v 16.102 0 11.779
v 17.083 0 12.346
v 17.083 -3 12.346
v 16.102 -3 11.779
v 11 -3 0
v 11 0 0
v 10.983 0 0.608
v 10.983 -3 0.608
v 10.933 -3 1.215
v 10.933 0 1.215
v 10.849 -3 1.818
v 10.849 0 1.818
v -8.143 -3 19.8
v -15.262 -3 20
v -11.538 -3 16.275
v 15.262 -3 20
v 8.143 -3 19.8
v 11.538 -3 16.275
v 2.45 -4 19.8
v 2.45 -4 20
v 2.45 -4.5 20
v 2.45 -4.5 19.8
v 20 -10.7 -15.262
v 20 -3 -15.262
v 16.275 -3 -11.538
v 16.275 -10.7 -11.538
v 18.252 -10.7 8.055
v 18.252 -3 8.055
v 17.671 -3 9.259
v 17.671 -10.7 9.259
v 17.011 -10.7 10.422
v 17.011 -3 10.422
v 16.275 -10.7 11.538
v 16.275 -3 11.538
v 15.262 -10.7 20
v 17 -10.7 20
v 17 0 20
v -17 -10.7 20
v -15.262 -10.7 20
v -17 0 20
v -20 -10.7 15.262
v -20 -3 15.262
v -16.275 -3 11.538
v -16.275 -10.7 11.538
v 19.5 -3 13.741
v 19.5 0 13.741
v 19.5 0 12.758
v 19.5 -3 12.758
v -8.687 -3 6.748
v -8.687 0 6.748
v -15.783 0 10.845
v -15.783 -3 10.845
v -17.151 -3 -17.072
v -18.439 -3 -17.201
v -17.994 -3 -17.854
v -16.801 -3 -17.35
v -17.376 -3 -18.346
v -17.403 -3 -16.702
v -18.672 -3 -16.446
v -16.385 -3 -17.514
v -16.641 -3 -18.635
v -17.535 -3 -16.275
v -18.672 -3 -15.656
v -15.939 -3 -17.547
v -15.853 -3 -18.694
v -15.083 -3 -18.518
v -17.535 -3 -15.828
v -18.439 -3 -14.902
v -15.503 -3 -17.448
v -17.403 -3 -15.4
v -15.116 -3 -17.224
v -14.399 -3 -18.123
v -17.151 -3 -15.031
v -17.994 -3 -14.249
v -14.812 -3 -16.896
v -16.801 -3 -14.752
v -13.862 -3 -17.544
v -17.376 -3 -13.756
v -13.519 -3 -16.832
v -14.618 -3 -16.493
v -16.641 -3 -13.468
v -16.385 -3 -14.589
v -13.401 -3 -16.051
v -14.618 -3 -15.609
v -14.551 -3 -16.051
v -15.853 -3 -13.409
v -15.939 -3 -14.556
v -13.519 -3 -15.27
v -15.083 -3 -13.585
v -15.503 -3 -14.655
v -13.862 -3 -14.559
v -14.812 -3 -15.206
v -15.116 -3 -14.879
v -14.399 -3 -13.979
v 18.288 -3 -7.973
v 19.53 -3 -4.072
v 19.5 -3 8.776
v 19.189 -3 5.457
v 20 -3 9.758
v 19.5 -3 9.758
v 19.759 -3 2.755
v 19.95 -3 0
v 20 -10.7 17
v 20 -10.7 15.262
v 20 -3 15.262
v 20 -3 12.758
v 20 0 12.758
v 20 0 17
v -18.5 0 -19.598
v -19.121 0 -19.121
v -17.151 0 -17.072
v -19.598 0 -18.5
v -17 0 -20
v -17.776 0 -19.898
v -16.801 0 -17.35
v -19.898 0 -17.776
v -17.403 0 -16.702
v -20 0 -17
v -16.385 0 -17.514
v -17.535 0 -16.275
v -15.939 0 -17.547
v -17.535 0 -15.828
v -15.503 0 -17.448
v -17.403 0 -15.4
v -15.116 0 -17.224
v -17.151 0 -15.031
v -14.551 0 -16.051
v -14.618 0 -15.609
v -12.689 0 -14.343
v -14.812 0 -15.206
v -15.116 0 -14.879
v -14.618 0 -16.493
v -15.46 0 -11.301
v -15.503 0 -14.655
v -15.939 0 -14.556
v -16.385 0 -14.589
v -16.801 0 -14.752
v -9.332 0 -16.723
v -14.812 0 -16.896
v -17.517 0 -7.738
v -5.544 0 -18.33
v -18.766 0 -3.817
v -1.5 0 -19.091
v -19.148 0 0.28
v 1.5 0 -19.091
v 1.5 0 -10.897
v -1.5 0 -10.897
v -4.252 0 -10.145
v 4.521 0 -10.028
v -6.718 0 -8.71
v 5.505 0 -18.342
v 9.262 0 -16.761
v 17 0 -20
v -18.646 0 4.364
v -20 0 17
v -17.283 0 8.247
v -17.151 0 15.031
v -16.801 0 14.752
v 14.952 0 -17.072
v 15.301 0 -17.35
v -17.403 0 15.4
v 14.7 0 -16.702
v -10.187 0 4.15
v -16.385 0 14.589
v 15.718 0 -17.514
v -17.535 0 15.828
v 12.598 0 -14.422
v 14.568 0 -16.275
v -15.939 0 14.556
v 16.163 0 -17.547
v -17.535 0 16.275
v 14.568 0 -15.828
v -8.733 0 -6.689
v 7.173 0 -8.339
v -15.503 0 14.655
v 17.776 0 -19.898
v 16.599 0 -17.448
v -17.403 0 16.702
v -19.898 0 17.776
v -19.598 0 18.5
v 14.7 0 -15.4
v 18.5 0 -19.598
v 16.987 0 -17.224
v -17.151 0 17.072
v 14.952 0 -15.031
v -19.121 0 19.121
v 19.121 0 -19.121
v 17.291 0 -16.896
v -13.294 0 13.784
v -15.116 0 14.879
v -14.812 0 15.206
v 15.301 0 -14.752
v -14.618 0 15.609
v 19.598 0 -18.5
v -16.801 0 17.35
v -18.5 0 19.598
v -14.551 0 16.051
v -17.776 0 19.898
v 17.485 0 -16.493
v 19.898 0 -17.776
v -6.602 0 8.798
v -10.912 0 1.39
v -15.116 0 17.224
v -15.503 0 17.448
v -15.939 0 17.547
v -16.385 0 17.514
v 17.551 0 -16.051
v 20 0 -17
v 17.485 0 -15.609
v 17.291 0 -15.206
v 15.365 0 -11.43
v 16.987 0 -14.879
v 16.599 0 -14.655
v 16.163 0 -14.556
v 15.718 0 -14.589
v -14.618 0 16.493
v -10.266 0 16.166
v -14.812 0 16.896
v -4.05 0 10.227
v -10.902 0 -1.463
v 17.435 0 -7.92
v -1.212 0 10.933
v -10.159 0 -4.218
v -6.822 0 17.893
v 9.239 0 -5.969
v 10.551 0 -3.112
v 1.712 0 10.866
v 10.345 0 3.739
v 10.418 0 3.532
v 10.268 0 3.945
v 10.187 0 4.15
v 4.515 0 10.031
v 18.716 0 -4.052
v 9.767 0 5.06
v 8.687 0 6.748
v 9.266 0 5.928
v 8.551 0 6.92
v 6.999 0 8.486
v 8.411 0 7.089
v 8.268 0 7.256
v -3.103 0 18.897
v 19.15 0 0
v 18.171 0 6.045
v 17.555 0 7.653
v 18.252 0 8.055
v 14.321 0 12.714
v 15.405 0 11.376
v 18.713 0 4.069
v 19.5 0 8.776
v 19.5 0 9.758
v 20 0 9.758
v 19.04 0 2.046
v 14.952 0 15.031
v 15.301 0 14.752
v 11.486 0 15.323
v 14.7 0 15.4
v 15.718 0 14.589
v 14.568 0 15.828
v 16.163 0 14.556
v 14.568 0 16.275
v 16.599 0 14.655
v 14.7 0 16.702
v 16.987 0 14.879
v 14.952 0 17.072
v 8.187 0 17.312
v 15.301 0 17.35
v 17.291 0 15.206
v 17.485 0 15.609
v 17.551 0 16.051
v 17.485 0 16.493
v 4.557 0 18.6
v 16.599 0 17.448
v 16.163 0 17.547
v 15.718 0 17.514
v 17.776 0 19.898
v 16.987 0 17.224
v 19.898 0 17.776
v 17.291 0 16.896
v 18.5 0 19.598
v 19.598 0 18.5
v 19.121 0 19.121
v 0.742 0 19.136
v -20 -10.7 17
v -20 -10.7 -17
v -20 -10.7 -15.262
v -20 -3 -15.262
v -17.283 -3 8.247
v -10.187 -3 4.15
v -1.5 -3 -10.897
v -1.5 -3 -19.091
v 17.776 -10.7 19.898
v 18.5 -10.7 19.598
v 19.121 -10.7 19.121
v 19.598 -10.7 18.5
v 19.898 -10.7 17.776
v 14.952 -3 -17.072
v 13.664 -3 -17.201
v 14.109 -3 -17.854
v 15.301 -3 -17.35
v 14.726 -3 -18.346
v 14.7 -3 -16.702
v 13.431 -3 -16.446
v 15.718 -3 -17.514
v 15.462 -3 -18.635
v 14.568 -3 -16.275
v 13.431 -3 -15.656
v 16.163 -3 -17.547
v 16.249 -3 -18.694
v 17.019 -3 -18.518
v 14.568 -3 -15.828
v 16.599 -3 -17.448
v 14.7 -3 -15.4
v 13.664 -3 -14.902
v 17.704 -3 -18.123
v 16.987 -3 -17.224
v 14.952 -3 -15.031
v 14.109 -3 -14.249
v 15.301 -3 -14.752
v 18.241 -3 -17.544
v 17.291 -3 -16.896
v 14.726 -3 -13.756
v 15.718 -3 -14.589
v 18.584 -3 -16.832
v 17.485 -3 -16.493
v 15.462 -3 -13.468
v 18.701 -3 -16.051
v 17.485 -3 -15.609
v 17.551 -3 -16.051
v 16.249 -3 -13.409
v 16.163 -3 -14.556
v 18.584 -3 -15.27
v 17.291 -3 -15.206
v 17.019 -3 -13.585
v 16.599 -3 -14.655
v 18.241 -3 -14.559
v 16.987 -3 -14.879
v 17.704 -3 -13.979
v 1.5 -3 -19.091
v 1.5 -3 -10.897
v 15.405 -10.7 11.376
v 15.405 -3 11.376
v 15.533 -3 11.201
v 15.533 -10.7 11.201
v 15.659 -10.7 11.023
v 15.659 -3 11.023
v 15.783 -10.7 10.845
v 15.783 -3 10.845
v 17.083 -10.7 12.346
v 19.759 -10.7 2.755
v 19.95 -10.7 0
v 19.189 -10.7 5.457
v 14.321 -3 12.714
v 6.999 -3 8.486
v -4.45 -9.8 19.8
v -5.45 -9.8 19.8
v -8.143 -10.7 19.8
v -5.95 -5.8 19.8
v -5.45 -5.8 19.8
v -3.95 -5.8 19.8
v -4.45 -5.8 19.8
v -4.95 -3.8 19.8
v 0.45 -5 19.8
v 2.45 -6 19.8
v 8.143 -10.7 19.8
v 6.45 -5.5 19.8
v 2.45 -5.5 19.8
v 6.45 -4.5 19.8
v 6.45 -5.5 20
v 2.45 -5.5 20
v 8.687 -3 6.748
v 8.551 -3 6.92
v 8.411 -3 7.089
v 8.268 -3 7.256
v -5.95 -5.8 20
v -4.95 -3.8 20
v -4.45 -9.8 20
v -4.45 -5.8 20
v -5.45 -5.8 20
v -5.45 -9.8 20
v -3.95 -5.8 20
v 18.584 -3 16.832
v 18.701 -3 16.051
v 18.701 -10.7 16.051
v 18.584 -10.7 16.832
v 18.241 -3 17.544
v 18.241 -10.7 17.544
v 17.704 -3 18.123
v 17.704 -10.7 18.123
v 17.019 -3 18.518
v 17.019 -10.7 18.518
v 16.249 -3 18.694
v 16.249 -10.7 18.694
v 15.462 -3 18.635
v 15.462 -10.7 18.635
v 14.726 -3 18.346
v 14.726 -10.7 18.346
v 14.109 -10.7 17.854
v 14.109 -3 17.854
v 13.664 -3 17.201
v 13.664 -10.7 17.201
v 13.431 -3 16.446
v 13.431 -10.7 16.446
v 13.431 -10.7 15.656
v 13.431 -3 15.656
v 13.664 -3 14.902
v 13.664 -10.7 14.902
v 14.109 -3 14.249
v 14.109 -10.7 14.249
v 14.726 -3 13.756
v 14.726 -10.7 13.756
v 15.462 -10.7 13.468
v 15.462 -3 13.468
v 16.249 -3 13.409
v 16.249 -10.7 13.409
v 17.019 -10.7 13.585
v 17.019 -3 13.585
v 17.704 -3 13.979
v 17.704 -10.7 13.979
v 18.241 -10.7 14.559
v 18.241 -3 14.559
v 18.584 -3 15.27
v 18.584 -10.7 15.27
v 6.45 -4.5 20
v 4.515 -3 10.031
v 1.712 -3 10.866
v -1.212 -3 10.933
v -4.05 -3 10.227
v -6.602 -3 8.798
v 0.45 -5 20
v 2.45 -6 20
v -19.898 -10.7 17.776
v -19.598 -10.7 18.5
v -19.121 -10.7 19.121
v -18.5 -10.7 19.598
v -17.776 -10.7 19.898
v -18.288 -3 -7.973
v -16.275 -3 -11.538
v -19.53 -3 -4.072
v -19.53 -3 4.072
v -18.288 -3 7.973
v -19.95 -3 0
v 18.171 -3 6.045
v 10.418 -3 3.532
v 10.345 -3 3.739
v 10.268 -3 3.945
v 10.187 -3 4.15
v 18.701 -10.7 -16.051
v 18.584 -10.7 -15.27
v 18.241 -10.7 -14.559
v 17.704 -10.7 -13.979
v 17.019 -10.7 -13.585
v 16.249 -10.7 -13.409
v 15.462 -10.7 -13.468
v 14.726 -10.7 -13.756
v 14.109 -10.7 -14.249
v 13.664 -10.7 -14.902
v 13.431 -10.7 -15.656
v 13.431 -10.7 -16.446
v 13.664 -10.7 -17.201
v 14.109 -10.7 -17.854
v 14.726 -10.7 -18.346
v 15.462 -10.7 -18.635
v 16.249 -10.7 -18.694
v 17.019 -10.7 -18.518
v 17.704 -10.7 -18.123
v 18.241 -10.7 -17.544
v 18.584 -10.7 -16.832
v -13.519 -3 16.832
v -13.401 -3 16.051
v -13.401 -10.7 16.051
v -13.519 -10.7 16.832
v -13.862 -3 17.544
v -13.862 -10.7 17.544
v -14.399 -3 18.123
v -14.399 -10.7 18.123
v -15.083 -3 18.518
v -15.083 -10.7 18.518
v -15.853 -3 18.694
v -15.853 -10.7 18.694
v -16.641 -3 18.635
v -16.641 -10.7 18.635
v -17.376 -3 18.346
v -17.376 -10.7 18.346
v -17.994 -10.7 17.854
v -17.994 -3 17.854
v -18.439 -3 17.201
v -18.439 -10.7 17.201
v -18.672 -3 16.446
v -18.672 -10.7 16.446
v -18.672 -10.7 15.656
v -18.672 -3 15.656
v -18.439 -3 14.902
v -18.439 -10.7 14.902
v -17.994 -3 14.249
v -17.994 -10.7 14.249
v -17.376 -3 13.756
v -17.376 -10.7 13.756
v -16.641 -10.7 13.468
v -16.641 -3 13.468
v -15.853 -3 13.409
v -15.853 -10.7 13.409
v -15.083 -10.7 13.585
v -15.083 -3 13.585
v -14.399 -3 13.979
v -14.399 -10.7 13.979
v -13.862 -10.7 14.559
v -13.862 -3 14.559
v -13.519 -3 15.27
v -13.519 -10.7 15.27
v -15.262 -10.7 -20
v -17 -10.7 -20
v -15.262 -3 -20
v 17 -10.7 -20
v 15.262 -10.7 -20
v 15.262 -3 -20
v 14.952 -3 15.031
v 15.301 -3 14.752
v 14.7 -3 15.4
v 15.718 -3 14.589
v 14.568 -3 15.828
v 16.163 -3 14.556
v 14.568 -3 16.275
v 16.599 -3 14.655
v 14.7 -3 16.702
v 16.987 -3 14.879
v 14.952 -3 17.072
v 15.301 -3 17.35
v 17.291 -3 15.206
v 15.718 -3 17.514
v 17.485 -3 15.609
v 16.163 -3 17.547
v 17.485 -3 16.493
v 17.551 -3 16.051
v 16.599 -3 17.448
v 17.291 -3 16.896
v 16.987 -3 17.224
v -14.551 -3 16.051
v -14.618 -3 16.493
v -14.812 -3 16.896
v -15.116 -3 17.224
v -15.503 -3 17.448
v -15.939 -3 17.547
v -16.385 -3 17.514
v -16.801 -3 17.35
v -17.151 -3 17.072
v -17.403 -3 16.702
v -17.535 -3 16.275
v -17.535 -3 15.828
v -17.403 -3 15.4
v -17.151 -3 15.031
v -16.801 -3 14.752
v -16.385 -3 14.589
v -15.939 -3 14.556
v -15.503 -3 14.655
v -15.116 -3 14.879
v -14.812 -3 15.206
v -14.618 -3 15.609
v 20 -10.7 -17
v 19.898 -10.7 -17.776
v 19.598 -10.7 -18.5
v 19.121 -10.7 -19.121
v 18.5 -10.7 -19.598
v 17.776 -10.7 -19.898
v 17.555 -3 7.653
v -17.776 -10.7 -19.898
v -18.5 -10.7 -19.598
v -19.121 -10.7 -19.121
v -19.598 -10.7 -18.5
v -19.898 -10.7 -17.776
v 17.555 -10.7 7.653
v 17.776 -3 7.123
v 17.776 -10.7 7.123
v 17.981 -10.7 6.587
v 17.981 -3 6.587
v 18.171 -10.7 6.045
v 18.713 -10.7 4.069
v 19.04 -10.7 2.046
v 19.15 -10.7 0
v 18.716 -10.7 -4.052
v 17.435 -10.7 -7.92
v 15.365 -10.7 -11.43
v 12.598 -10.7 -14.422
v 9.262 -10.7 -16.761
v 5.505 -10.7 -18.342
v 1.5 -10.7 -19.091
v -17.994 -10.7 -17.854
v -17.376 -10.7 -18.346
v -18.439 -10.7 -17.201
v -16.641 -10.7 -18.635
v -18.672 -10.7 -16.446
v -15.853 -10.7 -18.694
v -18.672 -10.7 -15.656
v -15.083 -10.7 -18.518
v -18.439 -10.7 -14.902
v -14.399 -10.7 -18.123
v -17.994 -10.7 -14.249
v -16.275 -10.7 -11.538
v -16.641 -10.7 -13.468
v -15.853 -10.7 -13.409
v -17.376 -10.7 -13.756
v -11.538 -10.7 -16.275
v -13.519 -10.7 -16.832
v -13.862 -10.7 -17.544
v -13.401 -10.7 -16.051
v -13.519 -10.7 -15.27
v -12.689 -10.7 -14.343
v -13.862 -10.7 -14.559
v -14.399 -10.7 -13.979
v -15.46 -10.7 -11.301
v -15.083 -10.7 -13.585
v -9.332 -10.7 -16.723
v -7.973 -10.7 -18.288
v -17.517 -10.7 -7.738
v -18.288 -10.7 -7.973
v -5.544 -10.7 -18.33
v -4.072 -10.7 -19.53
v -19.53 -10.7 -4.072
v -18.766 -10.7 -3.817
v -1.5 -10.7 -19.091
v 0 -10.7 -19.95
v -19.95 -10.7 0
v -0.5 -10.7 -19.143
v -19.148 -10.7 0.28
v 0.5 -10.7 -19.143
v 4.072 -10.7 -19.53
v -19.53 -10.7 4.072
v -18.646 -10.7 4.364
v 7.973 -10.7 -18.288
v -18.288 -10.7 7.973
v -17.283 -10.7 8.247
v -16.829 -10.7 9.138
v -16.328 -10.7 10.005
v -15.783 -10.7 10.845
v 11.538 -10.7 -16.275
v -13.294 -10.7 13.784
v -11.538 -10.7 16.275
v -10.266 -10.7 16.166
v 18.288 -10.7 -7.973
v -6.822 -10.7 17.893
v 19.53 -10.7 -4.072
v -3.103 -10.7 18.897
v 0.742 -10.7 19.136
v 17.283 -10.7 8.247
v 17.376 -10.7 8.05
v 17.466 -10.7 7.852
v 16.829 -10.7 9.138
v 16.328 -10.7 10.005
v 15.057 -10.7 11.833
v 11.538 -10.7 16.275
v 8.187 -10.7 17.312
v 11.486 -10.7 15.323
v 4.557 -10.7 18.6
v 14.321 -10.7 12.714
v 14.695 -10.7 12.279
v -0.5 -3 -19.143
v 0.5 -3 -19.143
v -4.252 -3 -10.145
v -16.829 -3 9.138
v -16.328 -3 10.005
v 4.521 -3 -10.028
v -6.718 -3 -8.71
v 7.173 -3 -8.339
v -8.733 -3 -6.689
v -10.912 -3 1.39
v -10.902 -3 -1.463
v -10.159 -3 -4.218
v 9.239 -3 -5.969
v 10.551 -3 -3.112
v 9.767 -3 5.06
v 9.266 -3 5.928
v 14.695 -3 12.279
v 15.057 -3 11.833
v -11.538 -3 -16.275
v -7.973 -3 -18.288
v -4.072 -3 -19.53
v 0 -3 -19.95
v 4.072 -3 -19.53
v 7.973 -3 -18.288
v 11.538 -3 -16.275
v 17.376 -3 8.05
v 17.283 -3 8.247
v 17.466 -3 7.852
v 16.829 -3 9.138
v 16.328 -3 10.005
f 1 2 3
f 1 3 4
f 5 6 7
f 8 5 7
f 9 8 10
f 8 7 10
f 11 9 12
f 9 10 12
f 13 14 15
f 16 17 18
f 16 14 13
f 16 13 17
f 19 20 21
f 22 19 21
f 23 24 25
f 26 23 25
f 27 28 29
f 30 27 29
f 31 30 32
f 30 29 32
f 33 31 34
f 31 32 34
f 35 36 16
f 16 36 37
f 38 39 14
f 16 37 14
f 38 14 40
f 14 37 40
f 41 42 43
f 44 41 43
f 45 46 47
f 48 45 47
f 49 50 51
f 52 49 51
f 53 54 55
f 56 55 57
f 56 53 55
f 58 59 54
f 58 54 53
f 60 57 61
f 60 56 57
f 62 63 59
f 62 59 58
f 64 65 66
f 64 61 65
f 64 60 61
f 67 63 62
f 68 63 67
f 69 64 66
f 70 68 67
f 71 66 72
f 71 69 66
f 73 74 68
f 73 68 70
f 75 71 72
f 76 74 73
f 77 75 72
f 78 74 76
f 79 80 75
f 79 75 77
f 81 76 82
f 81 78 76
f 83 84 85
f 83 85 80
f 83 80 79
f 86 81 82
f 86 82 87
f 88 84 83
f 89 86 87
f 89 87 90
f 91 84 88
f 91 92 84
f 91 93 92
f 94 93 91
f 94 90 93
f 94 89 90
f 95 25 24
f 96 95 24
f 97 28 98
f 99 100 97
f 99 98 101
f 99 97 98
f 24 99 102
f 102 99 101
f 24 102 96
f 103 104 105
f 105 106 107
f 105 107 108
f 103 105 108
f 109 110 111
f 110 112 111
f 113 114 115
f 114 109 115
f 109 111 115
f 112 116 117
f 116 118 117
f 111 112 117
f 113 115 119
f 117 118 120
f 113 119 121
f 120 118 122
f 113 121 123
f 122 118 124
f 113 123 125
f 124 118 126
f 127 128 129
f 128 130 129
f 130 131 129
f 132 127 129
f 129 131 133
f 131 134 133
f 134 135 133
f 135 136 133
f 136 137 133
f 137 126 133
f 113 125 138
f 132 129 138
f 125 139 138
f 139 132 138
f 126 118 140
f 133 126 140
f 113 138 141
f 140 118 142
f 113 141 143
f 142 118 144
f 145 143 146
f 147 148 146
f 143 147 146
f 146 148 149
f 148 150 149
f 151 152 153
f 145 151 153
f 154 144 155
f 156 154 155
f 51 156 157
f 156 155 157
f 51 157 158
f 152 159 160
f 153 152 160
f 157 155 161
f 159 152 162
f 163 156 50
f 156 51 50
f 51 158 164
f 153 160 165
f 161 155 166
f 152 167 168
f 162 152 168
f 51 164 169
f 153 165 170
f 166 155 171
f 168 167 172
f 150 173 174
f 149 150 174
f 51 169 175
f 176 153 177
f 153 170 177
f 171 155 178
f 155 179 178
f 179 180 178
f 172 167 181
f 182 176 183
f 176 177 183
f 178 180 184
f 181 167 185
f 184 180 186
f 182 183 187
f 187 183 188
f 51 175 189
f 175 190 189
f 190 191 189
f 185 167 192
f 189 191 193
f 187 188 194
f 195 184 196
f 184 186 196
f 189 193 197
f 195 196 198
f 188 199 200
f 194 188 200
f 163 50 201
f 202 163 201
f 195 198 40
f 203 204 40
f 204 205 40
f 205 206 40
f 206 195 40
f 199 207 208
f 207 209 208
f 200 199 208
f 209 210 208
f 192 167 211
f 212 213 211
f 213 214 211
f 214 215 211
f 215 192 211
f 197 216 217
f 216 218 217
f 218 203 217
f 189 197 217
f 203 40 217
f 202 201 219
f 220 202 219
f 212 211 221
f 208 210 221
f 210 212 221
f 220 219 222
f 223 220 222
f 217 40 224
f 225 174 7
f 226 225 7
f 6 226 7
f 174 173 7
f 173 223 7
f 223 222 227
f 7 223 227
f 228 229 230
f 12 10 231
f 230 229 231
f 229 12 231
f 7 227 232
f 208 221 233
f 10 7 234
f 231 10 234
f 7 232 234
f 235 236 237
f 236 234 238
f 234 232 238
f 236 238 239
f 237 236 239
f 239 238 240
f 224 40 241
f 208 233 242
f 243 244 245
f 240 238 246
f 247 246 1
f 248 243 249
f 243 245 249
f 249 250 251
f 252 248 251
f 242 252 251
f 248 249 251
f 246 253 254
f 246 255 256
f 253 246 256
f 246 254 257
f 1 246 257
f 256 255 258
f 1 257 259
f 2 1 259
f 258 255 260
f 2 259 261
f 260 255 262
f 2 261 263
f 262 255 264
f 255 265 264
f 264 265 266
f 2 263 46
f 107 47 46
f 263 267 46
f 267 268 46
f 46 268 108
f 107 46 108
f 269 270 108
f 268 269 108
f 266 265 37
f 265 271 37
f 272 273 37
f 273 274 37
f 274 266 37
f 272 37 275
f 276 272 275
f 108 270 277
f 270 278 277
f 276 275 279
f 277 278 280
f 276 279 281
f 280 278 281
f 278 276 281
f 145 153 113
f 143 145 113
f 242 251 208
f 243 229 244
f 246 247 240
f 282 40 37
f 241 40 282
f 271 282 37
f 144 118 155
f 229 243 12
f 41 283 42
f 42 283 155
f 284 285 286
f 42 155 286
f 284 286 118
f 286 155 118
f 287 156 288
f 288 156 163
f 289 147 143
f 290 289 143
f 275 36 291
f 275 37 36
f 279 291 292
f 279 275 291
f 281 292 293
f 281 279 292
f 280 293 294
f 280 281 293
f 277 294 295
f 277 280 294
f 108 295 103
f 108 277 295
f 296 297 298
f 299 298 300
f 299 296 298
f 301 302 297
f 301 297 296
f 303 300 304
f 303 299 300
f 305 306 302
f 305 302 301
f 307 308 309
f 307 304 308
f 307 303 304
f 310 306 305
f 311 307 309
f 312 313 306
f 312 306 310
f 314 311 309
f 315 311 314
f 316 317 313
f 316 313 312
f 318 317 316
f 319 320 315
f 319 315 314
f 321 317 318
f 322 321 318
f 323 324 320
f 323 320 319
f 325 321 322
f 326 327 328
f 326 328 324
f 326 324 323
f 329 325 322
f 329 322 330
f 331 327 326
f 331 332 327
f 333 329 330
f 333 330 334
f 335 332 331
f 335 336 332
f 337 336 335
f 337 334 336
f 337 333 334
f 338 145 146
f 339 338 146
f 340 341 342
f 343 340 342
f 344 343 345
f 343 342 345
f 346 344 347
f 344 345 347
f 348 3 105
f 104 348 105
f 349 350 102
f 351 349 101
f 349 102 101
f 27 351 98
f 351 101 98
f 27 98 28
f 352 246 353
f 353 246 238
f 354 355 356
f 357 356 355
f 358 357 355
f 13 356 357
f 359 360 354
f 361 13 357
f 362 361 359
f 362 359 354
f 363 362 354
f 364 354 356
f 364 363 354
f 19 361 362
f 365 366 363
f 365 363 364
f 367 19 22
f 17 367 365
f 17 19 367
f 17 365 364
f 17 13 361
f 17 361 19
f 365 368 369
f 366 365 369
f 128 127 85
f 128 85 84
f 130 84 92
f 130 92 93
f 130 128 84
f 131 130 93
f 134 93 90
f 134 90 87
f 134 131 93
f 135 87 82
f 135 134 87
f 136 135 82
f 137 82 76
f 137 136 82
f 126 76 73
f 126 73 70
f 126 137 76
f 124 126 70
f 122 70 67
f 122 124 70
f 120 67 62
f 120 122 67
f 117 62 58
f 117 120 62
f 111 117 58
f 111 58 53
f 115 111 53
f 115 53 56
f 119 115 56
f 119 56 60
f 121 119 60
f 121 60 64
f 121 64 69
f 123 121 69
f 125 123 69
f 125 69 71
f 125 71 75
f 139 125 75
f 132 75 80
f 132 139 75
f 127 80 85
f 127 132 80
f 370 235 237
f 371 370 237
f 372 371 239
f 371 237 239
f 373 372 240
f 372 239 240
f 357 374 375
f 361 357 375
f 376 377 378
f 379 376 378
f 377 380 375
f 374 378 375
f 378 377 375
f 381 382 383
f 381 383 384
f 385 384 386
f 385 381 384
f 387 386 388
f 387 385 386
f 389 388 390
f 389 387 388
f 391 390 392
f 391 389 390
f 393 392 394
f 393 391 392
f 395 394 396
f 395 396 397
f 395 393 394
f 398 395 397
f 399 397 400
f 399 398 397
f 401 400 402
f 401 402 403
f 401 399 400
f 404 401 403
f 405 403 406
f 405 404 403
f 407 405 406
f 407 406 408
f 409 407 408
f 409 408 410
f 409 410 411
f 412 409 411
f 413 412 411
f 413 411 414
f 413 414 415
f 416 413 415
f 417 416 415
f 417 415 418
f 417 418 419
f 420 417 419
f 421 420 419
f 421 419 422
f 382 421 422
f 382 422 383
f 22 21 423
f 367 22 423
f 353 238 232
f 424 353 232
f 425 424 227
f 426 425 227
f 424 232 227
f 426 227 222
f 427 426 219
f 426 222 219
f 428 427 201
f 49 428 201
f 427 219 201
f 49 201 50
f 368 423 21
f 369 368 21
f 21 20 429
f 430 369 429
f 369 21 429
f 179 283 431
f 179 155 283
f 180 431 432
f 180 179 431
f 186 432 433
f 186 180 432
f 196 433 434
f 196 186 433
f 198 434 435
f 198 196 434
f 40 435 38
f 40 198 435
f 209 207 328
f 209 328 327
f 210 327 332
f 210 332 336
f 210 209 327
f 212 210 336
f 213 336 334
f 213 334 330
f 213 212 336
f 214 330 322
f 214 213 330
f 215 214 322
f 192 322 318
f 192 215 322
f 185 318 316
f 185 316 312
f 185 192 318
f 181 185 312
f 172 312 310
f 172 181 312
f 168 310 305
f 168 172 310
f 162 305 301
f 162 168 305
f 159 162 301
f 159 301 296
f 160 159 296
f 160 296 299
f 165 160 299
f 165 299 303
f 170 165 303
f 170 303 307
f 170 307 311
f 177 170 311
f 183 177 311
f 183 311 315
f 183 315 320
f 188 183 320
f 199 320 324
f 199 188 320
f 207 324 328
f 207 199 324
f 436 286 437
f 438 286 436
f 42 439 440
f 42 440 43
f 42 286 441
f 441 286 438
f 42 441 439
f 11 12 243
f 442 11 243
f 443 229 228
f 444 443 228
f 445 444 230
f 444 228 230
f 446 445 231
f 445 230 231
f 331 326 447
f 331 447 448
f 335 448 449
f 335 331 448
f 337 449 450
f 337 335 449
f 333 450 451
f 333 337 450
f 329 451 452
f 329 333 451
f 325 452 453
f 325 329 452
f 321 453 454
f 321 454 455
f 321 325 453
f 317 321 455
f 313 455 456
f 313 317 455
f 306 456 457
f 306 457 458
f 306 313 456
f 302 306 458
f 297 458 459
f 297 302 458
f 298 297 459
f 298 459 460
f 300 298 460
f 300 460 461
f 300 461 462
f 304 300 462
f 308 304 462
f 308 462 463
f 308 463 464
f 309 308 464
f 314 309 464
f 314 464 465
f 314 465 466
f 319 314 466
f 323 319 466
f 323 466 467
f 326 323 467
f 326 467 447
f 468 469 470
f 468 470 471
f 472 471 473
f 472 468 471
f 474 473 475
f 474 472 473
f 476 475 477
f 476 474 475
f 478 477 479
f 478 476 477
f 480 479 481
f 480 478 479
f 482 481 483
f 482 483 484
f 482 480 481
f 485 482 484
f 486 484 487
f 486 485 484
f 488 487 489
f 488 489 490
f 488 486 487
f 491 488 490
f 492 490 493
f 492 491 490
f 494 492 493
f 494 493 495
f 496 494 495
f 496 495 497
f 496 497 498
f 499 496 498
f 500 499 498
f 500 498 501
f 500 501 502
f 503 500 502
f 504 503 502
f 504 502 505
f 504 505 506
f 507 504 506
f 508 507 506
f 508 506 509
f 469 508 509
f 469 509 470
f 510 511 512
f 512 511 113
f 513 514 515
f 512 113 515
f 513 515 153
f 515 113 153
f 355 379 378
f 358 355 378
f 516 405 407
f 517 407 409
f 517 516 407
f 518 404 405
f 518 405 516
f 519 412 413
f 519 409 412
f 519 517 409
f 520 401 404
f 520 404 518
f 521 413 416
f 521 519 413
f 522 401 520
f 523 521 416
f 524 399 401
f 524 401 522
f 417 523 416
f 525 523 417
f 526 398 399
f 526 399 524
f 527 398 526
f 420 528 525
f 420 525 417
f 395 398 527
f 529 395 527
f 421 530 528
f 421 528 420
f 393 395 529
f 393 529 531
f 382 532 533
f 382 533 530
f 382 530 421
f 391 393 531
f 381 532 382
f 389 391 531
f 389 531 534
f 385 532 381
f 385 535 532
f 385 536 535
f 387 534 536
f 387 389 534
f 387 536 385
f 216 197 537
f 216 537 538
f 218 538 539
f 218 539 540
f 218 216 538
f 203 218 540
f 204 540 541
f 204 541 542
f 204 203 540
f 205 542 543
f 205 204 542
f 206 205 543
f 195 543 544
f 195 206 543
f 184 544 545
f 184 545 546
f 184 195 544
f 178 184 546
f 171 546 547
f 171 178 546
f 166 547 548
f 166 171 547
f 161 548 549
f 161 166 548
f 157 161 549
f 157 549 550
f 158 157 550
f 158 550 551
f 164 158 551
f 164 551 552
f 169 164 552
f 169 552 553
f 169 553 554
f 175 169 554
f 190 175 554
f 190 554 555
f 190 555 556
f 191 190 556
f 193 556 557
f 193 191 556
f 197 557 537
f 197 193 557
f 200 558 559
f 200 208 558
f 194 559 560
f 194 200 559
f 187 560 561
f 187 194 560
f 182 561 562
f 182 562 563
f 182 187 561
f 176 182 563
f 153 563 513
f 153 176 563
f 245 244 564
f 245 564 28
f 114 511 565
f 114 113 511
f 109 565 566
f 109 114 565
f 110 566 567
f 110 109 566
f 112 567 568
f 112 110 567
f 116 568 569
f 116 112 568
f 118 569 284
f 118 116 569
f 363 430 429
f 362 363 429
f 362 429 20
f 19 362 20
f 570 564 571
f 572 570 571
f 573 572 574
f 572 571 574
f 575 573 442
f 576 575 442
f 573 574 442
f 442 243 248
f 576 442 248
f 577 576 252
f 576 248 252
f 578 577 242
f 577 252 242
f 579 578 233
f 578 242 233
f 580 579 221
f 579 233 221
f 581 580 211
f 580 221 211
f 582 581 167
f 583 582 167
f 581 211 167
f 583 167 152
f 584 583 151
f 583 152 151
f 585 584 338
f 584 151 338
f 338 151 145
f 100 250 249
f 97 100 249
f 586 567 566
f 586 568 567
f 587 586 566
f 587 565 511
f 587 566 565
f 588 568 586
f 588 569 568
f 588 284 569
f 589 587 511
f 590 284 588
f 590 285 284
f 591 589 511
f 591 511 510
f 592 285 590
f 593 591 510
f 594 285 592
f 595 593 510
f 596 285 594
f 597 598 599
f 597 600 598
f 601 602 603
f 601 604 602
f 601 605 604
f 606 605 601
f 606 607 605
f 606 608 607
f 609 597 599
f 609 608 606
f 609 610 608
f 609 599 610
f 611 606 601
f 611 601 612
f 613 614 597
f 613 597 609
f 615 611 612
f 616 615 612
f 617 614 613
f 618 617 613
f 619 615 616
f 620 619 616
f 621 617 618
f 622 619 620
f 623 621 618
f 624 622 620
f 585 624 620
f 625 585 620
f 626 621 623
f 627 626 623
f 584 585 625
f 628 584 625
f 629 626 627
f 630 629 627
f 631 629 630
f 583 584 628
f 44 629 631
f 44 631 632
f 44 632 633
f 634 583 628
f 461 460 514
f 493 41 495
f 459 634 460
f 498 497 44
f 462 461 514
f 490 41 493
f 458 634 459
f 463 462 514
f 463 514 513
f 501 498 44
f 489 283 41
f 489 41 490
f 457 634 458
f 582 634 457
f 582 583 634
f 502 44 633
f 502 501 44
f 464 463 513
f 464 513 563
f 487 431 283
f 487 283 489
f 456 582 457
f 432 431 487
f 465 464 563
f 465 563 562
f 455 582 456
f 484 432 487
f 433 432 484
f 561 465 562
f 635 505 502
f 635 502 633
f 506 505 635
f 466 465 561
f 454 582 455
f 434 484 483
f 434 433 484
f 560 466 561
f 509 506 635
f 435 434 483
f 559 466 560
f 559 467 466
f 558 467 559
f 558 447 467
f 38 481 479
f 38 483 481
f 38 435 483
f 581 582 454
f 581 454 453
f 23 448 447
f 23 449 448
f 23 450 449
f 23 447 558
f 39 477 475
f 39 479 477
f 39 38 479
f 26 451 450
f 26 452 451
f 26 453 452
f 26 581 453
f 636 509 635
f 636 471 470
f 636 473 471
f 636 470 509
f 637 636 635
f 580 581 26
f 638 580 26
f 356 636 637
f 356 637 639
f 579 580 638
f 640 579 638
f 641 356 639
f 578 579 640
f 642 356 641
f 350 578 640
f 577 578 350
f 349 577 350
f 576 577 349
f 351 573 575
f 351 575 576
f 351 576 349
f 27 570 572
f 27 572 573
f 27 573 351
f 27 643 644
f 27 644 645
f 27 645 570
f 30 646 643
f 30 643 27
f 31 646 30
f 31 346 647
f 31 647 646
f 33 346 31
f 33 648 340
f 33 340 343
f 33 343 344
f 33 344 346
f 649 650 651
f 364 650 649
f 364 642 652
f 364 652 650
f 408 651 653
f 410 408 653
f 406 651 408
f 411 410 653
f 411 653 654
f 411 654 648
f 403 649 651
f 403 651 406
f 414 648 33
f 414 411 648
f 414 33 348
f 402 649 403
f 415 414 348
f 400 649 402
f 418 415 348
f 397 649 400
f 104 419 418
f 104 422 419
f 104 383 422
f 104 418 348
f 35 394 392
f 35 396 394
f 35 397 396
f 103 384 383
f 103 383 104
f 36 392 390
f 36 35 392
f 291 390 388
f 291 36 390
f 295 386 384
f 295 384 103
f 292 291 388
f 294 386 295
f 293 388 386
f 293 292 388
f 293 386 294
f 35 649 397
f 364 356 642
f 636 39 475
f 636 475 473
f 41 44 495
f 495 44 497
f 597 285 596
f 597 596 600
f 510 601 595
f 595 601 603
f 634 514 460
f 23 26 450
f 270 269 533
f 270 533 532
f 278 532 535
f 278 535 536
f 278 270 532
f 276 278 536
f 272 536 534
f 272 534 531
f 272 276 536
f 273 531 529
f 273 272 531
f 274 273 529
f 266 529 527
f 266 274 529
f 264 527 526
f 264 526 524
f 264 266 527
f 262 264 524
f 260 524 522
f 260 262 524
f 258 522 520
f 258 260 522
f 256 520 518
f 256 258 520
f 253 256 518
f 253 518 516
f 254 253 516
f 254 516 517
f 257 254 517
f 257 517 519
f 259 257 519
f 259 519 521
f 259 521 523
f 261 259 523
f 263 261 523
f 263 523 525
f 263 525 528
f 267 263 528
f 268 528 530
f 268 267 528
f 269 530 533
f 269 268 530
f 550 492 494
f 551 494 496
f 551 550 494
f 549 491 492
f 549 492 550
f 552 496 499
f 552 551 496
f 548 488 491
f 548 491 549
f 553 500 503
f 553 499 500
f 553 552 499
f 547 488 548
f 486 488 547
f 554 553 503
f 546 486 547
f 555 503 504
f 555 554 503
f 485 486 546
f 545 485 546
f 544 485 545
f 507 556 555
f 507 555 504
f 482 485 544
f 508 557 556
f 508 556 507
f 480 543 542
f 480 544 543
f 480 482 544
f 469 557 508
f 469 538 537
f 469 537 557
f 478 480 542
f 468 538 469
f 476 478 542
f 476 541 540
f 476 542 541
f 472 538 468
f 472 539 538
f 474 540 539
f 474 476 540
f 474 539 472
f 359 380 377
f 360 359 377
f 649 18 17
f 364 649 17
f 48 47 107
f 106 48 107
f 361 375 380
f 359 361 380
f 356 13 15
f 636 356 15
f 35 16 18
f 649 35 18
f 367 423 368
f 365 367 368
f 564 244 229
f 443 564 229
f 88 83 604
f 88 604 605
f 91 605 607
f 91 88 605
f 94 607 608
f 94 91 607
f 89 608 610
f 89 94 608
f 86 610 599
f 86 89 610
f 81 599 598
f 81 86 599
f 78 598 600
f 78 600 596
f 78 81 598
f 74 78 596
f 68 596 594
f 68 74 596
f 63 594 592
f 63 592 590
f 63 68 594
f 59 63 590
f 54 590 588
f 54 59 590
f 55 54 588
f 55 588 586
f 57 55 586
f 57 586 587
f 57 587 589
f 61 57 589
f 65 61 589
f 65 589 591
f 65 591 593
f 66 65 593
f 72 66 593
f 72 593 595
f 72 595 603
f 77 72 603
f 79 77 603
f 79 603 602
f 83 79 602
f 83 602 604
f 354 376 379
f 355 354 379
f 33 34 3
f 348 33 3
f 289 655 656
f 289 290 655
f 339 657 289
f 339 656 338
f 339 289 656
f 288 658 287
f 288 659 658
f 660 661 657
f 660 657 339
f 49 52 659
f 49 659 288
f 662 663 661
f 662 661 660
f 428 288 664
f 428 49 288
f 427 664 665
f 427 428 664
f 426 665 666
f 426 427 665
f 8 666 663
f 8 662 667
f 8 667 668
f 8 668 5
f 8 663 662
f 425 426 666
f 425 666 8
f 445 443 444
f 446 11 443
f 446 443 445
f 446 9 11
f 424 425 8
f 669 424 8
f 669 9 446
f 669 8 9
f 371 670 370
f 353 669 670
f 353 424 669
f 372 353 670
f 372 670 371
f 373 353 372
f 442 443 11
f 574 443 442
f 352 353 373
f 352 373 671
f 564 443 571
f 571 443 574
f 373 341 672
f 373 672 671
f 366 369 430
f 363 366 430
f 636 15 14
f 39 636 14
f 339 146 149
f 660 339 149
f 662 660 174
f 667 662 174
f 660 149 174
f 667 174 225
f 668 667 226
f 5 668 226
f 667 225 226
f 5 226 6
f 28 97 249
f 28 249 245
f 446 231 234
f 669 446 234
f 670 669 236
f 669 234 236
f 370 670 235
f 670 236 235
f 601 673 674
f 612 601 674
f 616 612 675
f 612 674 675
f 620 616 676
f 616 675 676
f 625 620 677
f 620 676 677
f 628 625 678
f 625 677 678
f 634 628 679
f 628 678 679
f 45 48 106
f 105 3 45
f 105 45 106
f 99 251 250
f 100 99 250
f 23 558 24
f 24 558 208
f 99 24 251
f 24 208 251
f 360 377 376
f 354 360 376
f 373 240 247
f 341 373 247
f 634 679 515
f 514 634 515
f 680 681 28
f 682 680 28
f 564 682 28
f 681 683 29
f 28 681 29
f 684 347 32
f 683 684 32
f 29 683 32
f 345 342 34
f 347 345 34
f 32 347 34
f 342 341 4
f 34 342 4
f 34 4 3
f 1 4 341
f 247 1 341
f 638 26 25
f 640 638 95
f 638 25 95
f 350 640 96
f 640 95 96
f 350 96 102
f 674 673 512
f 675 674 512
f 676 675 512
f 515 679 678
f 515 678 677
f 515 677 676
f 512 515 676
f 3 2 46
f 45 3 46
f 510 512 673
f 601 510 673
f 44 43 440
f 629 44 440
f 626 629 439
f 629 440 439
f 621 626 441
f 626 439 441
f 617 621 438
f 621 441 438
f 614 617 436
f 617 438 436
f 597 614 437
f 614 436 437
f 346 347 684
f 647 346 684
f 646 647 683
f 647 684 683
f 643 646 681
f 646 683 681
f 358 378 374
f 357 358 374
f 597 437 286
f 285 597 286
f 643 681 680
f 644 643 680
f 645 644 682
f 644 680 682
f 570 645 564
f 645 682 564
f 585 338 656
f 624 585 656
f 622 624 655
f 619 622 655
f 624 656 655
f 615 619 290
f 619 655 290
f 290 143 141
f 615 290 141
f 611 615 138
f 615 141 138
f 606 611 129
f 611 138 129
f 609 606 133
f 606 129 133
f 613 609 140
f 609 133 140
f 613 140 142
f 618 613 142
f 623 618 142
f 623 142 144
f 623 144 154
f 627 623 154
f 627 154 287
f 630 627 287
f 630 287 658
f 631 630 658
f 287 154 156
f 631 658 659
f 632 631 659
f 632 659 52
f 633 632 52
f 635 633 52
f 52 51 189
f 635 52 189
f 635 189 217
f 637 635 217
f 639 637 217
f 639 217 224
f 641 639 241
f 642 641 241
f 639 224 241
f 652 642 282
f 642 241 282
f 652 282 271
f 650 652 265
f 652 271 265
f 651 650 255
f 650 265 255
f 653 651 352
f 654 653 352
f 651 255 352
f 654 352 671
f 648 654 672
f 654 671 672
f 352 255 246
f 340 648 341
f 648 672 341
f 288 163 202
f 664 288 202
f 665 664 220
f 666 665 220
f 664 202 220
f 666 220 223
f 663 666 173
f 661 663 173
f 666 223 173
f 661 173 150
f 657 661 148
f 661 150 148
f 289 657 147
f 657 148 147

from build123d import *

# Parameters (mm, degrees)
F0_R     = 2.65
F0_R_2   = 1.5
F1_DEPTH = 3
F2_DEPTH = 10.7
F3_DEPTH = 3
F4_R     = 3
F5_W     = 2
F5_H     = 7.7
F5_W_2   = 15.9
F6_DEPTH = 0.2


with BuildPart() as f1:
    # F0 (on Front) → F1 (new body)
    with BuildSketch(Plane.XZ):
        with BuildLine():
            ThreePointArc((-16.2752810298, -11.5376655958), (-19.95, 0), (-16.2752810298, 11.5376655958))
            Line((-16.2752810298, 11.5376655958), (-20, 15.2623845661))
            Line((-20, 15.2623845661), (-20, -15.2623845661))
            Line((-20, -15.2623845661), (-16.2752810298, -11.5376655958))
        make_face()
        with BuildLine():
            ThreePointArc((16.1015828965, 11.7788593772), (14.0013023046, 14.2114754257), (11.5376655958, 16.2752810298))
            ThreePointArc((11.5376655958, 16.2752810298), (0, 19.95), (-11.5376655958, 16.2752810298))
            ThreePointArc((-11.5376655958, 16.2752810298), (-14.1067802847, 14.1067802847), (-16.2752810298, 11.5376655958))
            ThreePointArc((-16.2752810298, 11.5376655958), (-19.95, 0), (-16.2752810298, -11.5376655958))
            ThreePointArc((-16.2752810298, -11.5376655958), (-14.1067802847, -14.1067802847), (-11.5376655958, -16.2752810298))
            ThreePointArc((-11.5376655958, -16.2752810298), (0, -19.95), (11.5376655958, -16.2752810298))
            ThreePointArc((11.5376655958, -16.2752810298), (14.1067802847, -14.1067802847), (16.2752810298, -11.5376655958))
            ThreePointArc((16.2752810298, -11.5376655958), (19.0091340748, -6.0543638582), (19.95, 0))
            ThreePointArc((19.95, 0), (19.5207784013, 4.1160309289), (18.2515828965, 8.0549501409))
            Line((18.2515828965, 8.0549501409), (17.5545327604, 7.6525080572))
            ThreePointArc((17.5545327604, 7.6525080572), (17.8807178068, 6.8558318761), (18.1707686799, 6.0453011159))
            ThreePointArc((18.1707686799, 6.0453011159), (18.9036070661, 3.0620483161), (19.15, 0))
            ThreePointArc((19.15, 0), (14.0614277369, -12.999951923), (1.5, -19.0911628771))
            ThreePointArc((1.5, -19.0911628771), (0, -19.15), (-1.5, -19.0911628771))
            ThreePointArc((-1.5, -19.0911628771), (-16.5843864825, -9.575), (-17.2834320394, 8.2465433329))
            ThreePointArc((-17.2834320394, 8.2465433329), (-16.5843864825, 9.575), (-15.7834320394, 10.8446195442))
            ThreePointArc((-15.7834320394, 10.8446195442), (-1.1866795704, 19.1131967917), (14.3207686799, 12.7136967251))
            ThreePointArc((14.3207686799, 12.7136967251), (14.8776834722, 12.0572399206), (15.4045327604, 11.3764172935))
            Line((15.4045327604, 11.3764172935), (16.1015828965, 11.7788593772))
        make_face()
        with BuildLine():
            ThreePointArc((-16.2752810298, 11.5376655958), (-14.1067802847, 14.1067802847), (-11.5376655958, 16.2752810298))
            Line((-11.5376655958, 16.2752810298), (-15.2623845661, 20))
            Line((-15.2623845661, 20), (-20, 20))
            Line((-20, 20), (-20, 15.2623845661))
            Line((-20, 15.2623845661), (-16.2752810298, 11.5376655958))
        make_face()
        with Locations((-16.0513239329, 16.0513239329)):
            Circle(F0_R, mode=Mode.SUBTRACT)
        Polygon((-11.5376655958, 16.2752810298), (-7.95, 20), (-15.2623845661, 20), align=None)
        with BuildLine():
            Line((11.5376655958, 16.2752810298), (7.95, 20))
            Line((7.95, 20), (-7.95, 20))
            Line((-7.95, 20), (-11.5376655958, 16.2752810298))
            ThreePointArc((-11.5376655958, 16.2752810298), (0, 19.95), (11.5376655958, 16.2752810298))
        make_face()
        Polygon((11.5376655958, 16.2752810298), (15.2623845661, 20), (7.95, 20), align=None)
        with BuildLine():
            Line((20, 15.2623845661), (20, 20))
            Line((20, 20), (15.2623845661, 20))
            Line((15.2623845661, 20), (11.5376655958, 16.2752810298))
            ThreePointArc((11.5376655958, 16.2752810298), (14.0013023046, 14.2114754257), (16.1015828965, 11.7788593772))
            Line((16.1015828965, 11.7788593772), (17.0832277064, 12.3456122724))
            Line((17.0832277064, 12.3456122724), (20, 15.2623845661))
        make_face()
        with Locations((16.0513239329, 16.0513239329)):
            Circle(F0_R, mode=Mode.SUBTRACT)
        with Locations((-16.0513239329, 16.0513239329)):
            Circle(F0_R)
        with Locations((-16.0513239329, 16.0513239329)):
            Circle(F0_R_2, mode=Mode.SUBTRACT)
        with Locations((16.0513239329, 16.0513239329)):
            Circle(F0_R)
        with Locations((16.0513239329, 16.0513239329)):
            Circle(F0_R_2, mode=Mode.SUBTRACT)
        with BuildLine():
            Line((-8.6872930441, 6.7476617851), (-15.7834320394, 10.8446195442))
            ThreePointArc((-15.7834320394, 10.8446195442), (-16.5843864825, 9.575), (-17.2834320394, 8.2465433329))
            Line((-17.2834320394, 8.2465433329), (-10.1872930441, 4.1495855737))
            ThreePointArc((-10.1872930441, 4.1495855737), (-9.5262794416, 5.5), (-8.6872930441, 6.7476617851))
        make_face()
        with BuildLine():
            ThreePointArc((8.6872930441, 6.7476617851), (8.481225936, 7.0049130346), (8.2675438185, 7.2558748066))
            ThreePointArc((8.2675438185, 7.2558748066), (7.6578946474, 7.8966226685), (6.9987394068, 8.4863211532))
            ThreePointArc((6.9987394068, 8.4863211532), (-1.2118322682, 10.9330445235), (-8.6872930441, 6.7476617851))
            ThreePointArc((-8.6872930441, 6.7476617851), (-9.5262794416, 5.5), (-10.1872930441, 4.1495855737))
            ThreePointArc((-10.1872930441, 4.1495855737), (-9.5262794416, -5.5), (-1.5, -10.8972473589))
            ThreePointArc((-1.5, -10.8972473589), (0, -11), (1.5, -10.8972473589))
            ThreePointArc((1.5, -10.8972473589), (8.2915619759, -7.2284161474), (11, 0))
            ThreePointArc((11, 0), (10.9621196279, 0.9121037566), (10.8487394068, 1.8179255441))
            ThreePointArc((10.8487394068, 1.8179255441), (10.6676231587, 2.6836199699), (10.4175438185, 3.5319655704))
            ThreePointArc((10.4175438185, 3.5319655704), (10.3070456073, 3.8425005985), (10.1872930441, 4.1495855737))
            ThreePointArc((10.1872930441, 4.1495855737), (9.5262794416, 5.5), (8.6872930441, 6.7476617851))
        make_face()
        with BuildLine():
            Line((8.2675438185, 7.2558748066), (15.4045327604, 11.3764172935))
            ThreePointArc((15.4045327604, 11.3764172935), (14.8776834722, 12.0572399206), (14.3207686799, 12.7136967251))
            Line((14.3207686799, 12.7136967251), (6.9987394068, 8.4863211532))
            ThreePointArc((6.9987394068, 8.4863211532), (7.6578946474, 7.8966226685), (8.2675438185, 7.2558748066))
        make_face()
        with BuildLine():
            ThreePointArc((18.1707686799, 6.0453011159), (17.8807178068, 6.8558318761), (17.5545327604, 7.6525080572))
            Line((17.5545327604, 7.6525080572), (10.4175438185, 3.5319655704))
            ThreePointArc((10.4175438185, 3.5319655704), (10.6676231587, 2.6836199699), (10.8487394068, 1.8179255441))
            Line((10.8487394068, 1.8179255441), (18.1707686799, 6.0453011159))
        make_face()
        with BuildLine():
            Line((19.5, 8.7757240917), (18.2515828965, 8.0549501409))
            ThreePointArc((18.2515828965, 8.0549501409), (19.5207784013, 4.1160309289), (19.95, 0))
            ThreePointArc((19.95, 0), (19.0091340748, -6.0543638582), (16.2752810298, -11.5376655958))
            Line((16.2752810298, -11.5376655958), (20, -15.2623845661))
            Line((20, -15.2623845661), (20, 9.0643992263))
            Line((20, 9.0643992263), (19.5, 8.7757240917))
        make_face()
        Polygon((20, 14.0296115413), (20, 15.2623845661), (17.0832277064, 12.3456122724), (19.5, 13.7409364067), align=None)
        Polygon((20, 12.7583302492), (20, 14.0296115413), (19.5, 13.7409364067), (19.5, 12.7583302492), align=None)
        Polygon((20, 9.0643992263), (20, 9.7583302492), (19.5, 9.7583302492), (19.5, 8.7757240917), align=None)
        with BuildLine():
            Line((16.2752810298, 11.5376655958), (17.0832277064, 12.3456122724))
            Line((17.0832277064, 12.3456122724), (16.1015828965, 11.7788593772))
            ThreePointArc((16.1015828965, 11.7788593772), (16.1888811545, 11.6585859762), (16.2752810298, 11.5376655958))
        make_face()
        with BuildLine():
            Line((20, -20), (20, -15.2623845661))
            Line((20, -15.2623845661), (16.2752810298, -11.5376655958))
            ThreePointArc((16.2752810298, -11.5376655958), (14.1067802847, -14.1067802847), (11.5376655958, -16.2752810298))
            Line((11.5376655958, -16.2752810298), (15.2623845661, -20))
            Line((15.2623845661, -20), (20, -20))
        make_face()
        with Locations((16.0513239329, -16.0513239329)):
            Circle(F0_R, mode=Mode.SUBTRACT)
        with BuildLine():
            ThreePointArc((11.5376655958, -16.2752810298), (0, -19.95), (-11.5376655958, -16.2752810298))
            Line((-11.5376655958, -16.2752810298), (-15.2623845661, -20))
            Line((-15.2623845661, -20), (15.2623845661, -20))
            Line((15.2623845661, -20), (11.5376655958, -16.2752810298))
        make_face()
        with BuildLine():
            ThreePointArc((-11.5376655958, -16.2752810298), (-14.1067802847, -14.1067802847), (-16.2752810298, -11.5376655958))
            Line((-16.2752810298, -11.5376655958), (-20, -15.2623845661))
            Line((-20, -15.2623845661), (-20, -20))
            Line((-20, -20), (-15.2623845661, -20))
            Line((-15.2623845661, -20), (-11.5376655958, -16.2752810298))
        make_face()
        with Locations((-16.0513239329, -16.0513239329)):
            Circle(F0_R, mode=Mode.SUBTRACT)
        with Locations((-16.0513239329, -16.0513239329)):
            Circle(F0_R)
        with Locations((-16.0513239329, -16.0513239329)):
            Circle(F0_R_2, mode=Mode.SUBTRACT)
        with Locations((16.0513239329, -16.0513239329)):
            Circle(F0_R)
        with Locations((16.0513239329, -16.0513239329)):
            Circle(F0_R_2, mode=Mode.SUBTRACT)
        with BuildLine():
            Line((-1.5, -10.8972473589), (-1.5, -19.0911628771))
            ThreePointArc((-1.5, -19.0911628771), (0, -19.15), (1.5, -19.0911628771))
            Line((1.5, -19.0911628771), (1.5, -10.8972473589))
            ThreePointArc((1.5, -10.8972473589), (0, -11), (-1.5, -10.8972473589))
        make_face()
    extrude(amount=F1_DEPTH)

    # F0 (on Front) → F2 (join)
    with BuildSketch(Plane.XZ):
        with BuildLine():
            Line((20, 15.2623845661), (20, 20))
            Line((20, 20), (15.2623845661, 20))
            Line((15.2623845661, 20), (11.5376655958, 16.2752810298))
            ThreePointArc((11.5376655958, 16.2752810298), (14.0013023046, 14.2114754257), (16.1015828965, 11.7788593772))
            Line((16.1015828965, 11.7788593772), (17.0832277064, 12.3456122724))
            Line((17.0832277064, 12.3456122724), (20, 15.2623845661))
        make_face()
        with Locations((16.0513239329, 16.0513239329)):
            Circle(F0_R, mode=Mode.SUBTRACT)
        with BuildLine():
            Line((11.5376655958, 16.2752810298), (7.95, 20))
            Line((7.95, 20), (-7.95, 20))
            Line((-7.95, 20), (-11.5376655958, 16.2752810298))
            ThreePointArc((-11.5376655958, 16.2752810298), (0, 19.95), (11.5376655958, 16.2752810298))
        make_face()
        with BuildLine():
            ThreePointArc((-16.2752810298, 11.5376655958), (-14.1067802847, 14.1067802847), (-11.5376655958, 16.2752810298))
            Line((-11.5376655958, 16.2752810298), (-15.2623845661, 20))
            Line((-15.2623845661, 20), (-20, 20))
            Line((-20, 20), (-20, 15.2623845661))
            Line((-20, 15.2623845661), (-16.2752810298, 11.5376655958))
        make_face()
        with Locations((-16.0513239329, 16.0513239329)):
            Circle(F0_R, mode=Mode.SUBTRACT)
        with BuildLine():
            ThreePointArc((16.1015828965, 11.7788593772), (14.0013023046, 14.2114754257), (11.5376655958, 16.2752810298))
            ThreePointArc((11.5376655958, 16.2752810298), (0, 19.95), (-11.5376655958, 16.2752810298))
            ThreePointArc((-11.5376655958, 16.2752810298), (-14.1067802847, 14.1067802847), (-16.2752810298, 11.5376655958))
            ThreePointArc((-16.2752810298, 11.5376655958), (-19.95, 0), (-16.2752810298, -11.5376655958))
            ThreePointArc((-16.2752810298, -11.5376655958), (-14.1067802847, -14.1067802847), (-11.5376655958, -16.2752810298))
            ThreePointArc((-11.5376655958, -16.2752810298), (0, -19.95), (11.5376655958, -16.2752810298))
            ThreePointArc((11.5376655958, -16.2752810298), (14.1067802847, -14.1067802847), (16.2752810298, -11.5376655958))
            ThreePointArc((16.2752810298, -11.5376655958), (19.0091340748, -6.0543638582), (19.95, 0))
            ThreePointArc((19.95, 0), (19.5207784013, 4.1160309289), (18.2515828965, 8.0549501409))
            Line((18.2515828965, 8.0549501409), (17.5545327604, 7.6525080572))
            ThreePointArc((17.5545327604, 7.6525080572), (17.8807178068, 6.8558318761), (18.1707686799, 6.0453011159))
            ThreePointArc((18.1707686799, 6.0453011159), (18.9036070661, 3.0620483161), (19.15, 0))
            ThreePointArc((19.15, 0), (14.0614277369, -12.999951923), (1.5, -19.0911628771))
            ThreePointArc((1.5, -19.0911628771), (0, -19.15), (-1.5, -19.0911628771))
            ThreePointArc((-1.5, -19.0911628771), (-16.5843864825, -9.575), (-17.2834320394, 8.2465433329))
            ThreePointArc((-17.2834320394, 8.2465433329), (-16.5843864825, 9.575), (-15.7834320394, 10.8446195442))
            ThreePointArc((-15.7834320394, 10.8446195442), (-1.1866795704, 19.1131967917), (14.3207686799, 12.7136967251))
            ThreePointArc((14.3207686799, 12.7136967251), (14.8776834722, 12.0572399206), (15.4045327604, 11.3764172935))
            Line((15.4045327604, 11.3764172935), (16.1015828965, 11.7788593772))
        make_face()
        with BuildLine():
            ThreePointArc((16.2752810298, 11.5376655958), (16.1888811545, 11.6585859762), (16.1015828965, 11.7788593772))
            Line((16.1015828965, 11.7788593772), (15.4045327604, 11.3764172935))
            ThreePointArc((15.4045327604, 11.3764172935), (15.5962492061, 11.1121334901), (15.7834320394, 10.8446195442))
            ThreePointArc((15.7834320394, 10.8446195442), (16.5843864825, 9.575), (17.2834320394, 8.2465433329))
            ThreePointArc((17.2834320394, 8.2465433329), (17.4215144957, 7.9506812712), (17.5545327604, 7.6525080572))
            Line((17.5545327604, 7.6525080572), (18.2515828965, 8.0549501409))
            ThreePointArc((18.2515828965, 8.0549501409), (17.351034836, 9.8460189985), (16.2752810298, 11.5376655958))
        make_face()
        with BuildLine():
            Line((20, -20), (20, -15.2623845661))
            Line((20, -15.2623845661), (16.2752810298, -11.5376655958))
            ThreePointArc((16.2752810298, -11.5376655958), (14.1067802847, -14.1067802847), (11.5376655958, -16.2752810298))
            Line((11.5376655958, -16.2752810298), (15.2623845661, -20))
            Line((15.2623845661, -20), (20, -20))
        make_face()
        with Locations((16.0513239329, -16.0513239329)):
            Circle(F0_R, mode=Mode.SUBTRACT)
        with BuildLine():
            ThreePointArc((-11.5376655958, -16.2752810298), (-14.1067802847, -14.1067802847), (-16.2752810298, -11.5376655958))
            Line((-16.2752810298, -11.5376655958), (-20, -15.2623845661))
            Line((-20, -15.2623845661), (-20, -20))
            Line((-20, -20), (-15.2623845661, -20))
            Line((-15.2623845661, -20), (-11.5376655958, -16.2752810298))
        make_face()
        with Locations((-16.0513239329, -16.0513239329)):
            Circle(F0_R, mode=Mode.SUBTRACT)
        with BuildLine():
            Line((16.2752810298, 11.5376655958), (17.0832277064, 12.3456122724))
            Line((17.0832277064, 12.3456122724), (16.1015828965, 11.7788593772))
            ThreePointArc((16.1015828965, 11.7788593772), (16.1888811545, 11.6585859762), (16.2752810298, 11.5376655958))
        make_face()
    extrude(amount=F2_DEPTH)

    # F0 (on Front) → F3 (cut, through all)
    with BuildSketch(Plane.XZ):
        with BuildLine():
            ThreePointArc((16.2752810298, 11.5376655958), (16.1888811545, 11.6585859762), (16.1015828965, 11.7788593772))
            Line((16.1015828965, 11.7788593772), (15.4045327604, 11.3764172935))
            ThreePointArc((15.4045327604, 11.3764172935), (15.5962492061, 11.1121334901), (15.7834320394, 10.8446195442))
            ThreePointArc((15.7834320394, 10.8446195442), (16.5843864825, 9.575), (17.2834320394, 8.2465433329))
            ThreePointArc((17.2834320394, 8.2465433329), (17.4215144957, 7.9506812712), (17.5545327604, 7.6525080572))
            Line((17.5545327604, 7.6525080572), (18.2515828965, 8.0549501409))
            ThreePointArc((18.2515828965, 8.0549501409), (17.351034836, 9.8460189985), (16.2752810298, 11.5376655958))
        make_face()
        with BuildLine():
            Line((16.2752810298, 11.5376655958), (17.0832277064, 12.3456122724))
            Line((17.0832277064, 12.3456122724), (16.1015828965, 11.7788593772))
            ThreePointArc((16.1015828965, 11.7788593772), (16.1888811545, 11.6585859762), (16.2752810298, 11.5376655958))
        make_face()
    extrude(amount=F3_DEPTH, mode=Mode.SUBTRACT)

    # F4
    f4_edges = [f1.edges().sort_by_distance(p)[0] for p in [
        (-20, -5.35, -20),
        (20, -5.35, -20),
        (20, -5.35, 20),
        (-20, -5.35, 20),
    ]]
    fillet(f4_edges, radius=F4_R)

    # F5 (on face) → F6 (cut)
    with BuildSketch(Plane.XY.offset(20)):
        with Locations((-8.95, -6.85)):
            Rectangle(F5_W, F5_H)
        with Locations((0, -6.85)):
            Rectangle(F5_W_2, F5_H)
        Polygon((-4.45, -9.8), (-5.45, -9.8), (-5.45, -5.8), (-5.95, -5.8), (-4.95, -3.8), (-3.95, -5.8), (-4.45, -5.8), align=None, mode=Mode.SUBTRACT)
        Polygon((6.45, -4.5), (6.45, -5.5), (2.45, -5.5), (2.45, -6), (0.45, -5), (2.45, -4), (2.45, -4.5), align=None, mode=Mode.SUBTRACT)
        with Locations((8.95, -6.85)):
            Rectangle(F5_W, F5_H)
    extrude(amount=-F6_DEPTH, mode=Mode.SUBTRACT)


solid = f1.part
